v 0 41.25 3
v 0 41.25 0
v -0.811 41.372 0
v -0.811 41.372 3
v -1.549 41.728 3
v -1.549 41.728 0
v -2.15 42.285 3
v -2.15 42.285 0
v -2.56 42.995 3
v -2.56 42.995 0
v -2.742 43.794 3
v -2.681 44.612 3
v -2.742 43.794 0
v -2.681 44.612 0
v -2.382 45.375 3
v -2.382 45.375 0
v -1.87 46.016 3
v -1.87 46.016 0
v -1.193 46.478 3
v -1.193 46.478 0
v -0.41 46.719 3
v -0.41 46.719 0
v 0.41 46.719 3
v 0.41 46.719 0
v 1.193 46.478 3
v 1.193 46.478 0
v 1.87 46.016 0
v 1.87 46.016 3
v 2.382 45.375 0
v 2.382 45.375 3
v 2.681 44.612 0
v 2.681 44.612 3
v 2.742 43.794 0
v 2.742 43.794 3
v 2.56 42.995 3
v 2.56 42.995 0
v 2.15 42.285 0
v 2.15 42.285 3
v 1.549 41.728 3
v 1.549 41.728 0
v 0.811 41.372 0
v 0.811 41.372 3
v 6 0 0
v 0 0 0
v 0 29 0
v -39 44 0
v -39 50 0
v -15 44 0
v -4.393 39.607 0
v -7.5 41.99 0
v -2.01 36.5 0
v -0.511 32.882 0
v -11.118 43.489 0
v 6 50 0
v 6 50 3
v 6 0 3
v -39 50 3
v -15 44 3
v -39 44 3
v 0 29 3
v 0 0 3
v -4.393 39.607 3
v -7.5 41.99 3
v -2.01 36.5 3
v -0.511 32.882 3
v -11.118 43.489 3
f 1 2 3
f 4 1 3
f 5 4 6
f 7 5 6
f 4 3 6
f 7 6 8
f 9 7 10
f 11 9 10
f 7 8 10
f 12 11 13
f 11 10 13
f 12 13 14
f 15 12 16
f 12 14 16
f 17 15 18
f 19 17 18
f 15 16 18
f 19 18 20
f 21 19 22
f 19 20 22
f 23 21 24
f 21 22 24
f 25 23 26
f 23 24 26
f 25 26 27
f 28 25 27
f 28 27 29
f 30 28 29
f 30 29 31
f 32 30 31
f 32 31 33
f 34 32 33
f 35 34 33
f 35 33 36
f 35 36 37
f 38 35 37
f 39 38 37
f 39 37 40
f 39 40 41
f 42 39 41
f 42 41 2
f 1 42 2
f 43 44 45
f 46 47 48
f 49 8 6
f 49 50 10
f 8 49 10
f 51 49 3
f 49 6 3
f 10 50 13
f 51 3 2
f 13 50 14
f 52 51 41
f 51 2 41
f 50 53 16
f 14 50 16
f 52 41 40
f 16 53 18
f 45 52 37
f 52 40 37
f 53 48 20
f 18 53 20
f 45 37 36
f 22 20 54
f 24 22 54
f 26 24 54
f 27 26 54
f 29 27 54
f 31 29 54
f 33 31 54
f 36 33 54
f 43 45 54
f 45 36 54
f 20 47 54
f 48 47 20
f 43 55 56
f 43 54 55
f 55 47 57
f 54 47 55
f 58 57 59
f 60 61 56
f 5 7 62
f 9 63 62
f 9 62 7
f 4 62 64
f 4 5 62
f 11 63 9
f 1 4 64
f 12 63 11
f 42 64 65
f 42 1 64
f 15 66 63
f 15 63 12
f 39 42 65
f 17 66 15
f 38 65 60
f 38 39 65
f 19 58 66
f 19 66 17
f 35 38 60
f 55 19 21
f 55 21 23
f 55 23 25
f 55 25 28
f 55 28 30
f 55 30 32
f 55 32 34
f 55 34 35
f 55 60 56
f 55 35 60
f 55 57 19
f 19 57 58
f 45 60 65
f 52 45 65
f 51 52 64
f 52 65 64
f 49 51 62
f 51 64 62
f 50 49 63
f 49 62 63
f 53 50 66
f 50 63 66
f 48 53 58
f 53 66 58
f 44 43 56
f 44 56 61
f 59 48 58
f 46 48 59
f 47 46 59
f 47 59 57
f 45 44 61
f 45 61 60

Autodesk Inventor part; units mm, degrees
ref_plane "YZ Plane" through (0, 0, 0) normal (1, 0, 0) x (0, 1, 0)
ref_plane "XZ Plane" through (0, 0, 0) normal (0, 1, 0) x (-1, 0, 0)
ref_plane "XY Plane" through (0, 0, 0) normal (0, 0, 1) x (1, 0, 0)
sketch "Sketch1" plane through (0, 0, 0) normal (0, 0, 1) x (1, 0, 0)
  line L0 (-39, 50) -> (6, 50)
  line L1 (6, 50) -> (6, 44)
  line L2 (6, 44) -> (-39, 44)
  line L3 (-39, 44) -> (-39, 50)
  line L4 (0, 44) -> (6, 44)
  line L5 (6, 44) -> (6, 0)
  line L6 (6, 0) -> (0, 0)
  line L7 (0, 0) -> (0, 44)
  dimension "d1" = 6
  dimension "d2" = 45
  dimension "d3" = 6
  dimension "d17" = 50
extrude "Extrusion1" add sketch "Sketch1" along normal blind 3
fillet "Fillet1" radius 15 1 edges at (0, 44, 1.5)
sketch "Sketch2" plane through (0, 0, 3) normal (0, 0, 1) x (1, 0, 0)
  line L0 (6, 50) -> (-39, 50) projected
  line L1 (6, 0) -> (6, 50) projected
  point P0 (0, 0)
  point P1 (0, 44)
  dimension "d8" = 6
  dimension "d9" = 6
hole "Hole1" at (0, 44, 3) direction (0, 0, -1) diameter 5.5 end through all
equation "\"d3\" = d1"
equation "\"d9\" = d8"
properties part number "Selection_Selector 1" material "Nylon 6/6"
